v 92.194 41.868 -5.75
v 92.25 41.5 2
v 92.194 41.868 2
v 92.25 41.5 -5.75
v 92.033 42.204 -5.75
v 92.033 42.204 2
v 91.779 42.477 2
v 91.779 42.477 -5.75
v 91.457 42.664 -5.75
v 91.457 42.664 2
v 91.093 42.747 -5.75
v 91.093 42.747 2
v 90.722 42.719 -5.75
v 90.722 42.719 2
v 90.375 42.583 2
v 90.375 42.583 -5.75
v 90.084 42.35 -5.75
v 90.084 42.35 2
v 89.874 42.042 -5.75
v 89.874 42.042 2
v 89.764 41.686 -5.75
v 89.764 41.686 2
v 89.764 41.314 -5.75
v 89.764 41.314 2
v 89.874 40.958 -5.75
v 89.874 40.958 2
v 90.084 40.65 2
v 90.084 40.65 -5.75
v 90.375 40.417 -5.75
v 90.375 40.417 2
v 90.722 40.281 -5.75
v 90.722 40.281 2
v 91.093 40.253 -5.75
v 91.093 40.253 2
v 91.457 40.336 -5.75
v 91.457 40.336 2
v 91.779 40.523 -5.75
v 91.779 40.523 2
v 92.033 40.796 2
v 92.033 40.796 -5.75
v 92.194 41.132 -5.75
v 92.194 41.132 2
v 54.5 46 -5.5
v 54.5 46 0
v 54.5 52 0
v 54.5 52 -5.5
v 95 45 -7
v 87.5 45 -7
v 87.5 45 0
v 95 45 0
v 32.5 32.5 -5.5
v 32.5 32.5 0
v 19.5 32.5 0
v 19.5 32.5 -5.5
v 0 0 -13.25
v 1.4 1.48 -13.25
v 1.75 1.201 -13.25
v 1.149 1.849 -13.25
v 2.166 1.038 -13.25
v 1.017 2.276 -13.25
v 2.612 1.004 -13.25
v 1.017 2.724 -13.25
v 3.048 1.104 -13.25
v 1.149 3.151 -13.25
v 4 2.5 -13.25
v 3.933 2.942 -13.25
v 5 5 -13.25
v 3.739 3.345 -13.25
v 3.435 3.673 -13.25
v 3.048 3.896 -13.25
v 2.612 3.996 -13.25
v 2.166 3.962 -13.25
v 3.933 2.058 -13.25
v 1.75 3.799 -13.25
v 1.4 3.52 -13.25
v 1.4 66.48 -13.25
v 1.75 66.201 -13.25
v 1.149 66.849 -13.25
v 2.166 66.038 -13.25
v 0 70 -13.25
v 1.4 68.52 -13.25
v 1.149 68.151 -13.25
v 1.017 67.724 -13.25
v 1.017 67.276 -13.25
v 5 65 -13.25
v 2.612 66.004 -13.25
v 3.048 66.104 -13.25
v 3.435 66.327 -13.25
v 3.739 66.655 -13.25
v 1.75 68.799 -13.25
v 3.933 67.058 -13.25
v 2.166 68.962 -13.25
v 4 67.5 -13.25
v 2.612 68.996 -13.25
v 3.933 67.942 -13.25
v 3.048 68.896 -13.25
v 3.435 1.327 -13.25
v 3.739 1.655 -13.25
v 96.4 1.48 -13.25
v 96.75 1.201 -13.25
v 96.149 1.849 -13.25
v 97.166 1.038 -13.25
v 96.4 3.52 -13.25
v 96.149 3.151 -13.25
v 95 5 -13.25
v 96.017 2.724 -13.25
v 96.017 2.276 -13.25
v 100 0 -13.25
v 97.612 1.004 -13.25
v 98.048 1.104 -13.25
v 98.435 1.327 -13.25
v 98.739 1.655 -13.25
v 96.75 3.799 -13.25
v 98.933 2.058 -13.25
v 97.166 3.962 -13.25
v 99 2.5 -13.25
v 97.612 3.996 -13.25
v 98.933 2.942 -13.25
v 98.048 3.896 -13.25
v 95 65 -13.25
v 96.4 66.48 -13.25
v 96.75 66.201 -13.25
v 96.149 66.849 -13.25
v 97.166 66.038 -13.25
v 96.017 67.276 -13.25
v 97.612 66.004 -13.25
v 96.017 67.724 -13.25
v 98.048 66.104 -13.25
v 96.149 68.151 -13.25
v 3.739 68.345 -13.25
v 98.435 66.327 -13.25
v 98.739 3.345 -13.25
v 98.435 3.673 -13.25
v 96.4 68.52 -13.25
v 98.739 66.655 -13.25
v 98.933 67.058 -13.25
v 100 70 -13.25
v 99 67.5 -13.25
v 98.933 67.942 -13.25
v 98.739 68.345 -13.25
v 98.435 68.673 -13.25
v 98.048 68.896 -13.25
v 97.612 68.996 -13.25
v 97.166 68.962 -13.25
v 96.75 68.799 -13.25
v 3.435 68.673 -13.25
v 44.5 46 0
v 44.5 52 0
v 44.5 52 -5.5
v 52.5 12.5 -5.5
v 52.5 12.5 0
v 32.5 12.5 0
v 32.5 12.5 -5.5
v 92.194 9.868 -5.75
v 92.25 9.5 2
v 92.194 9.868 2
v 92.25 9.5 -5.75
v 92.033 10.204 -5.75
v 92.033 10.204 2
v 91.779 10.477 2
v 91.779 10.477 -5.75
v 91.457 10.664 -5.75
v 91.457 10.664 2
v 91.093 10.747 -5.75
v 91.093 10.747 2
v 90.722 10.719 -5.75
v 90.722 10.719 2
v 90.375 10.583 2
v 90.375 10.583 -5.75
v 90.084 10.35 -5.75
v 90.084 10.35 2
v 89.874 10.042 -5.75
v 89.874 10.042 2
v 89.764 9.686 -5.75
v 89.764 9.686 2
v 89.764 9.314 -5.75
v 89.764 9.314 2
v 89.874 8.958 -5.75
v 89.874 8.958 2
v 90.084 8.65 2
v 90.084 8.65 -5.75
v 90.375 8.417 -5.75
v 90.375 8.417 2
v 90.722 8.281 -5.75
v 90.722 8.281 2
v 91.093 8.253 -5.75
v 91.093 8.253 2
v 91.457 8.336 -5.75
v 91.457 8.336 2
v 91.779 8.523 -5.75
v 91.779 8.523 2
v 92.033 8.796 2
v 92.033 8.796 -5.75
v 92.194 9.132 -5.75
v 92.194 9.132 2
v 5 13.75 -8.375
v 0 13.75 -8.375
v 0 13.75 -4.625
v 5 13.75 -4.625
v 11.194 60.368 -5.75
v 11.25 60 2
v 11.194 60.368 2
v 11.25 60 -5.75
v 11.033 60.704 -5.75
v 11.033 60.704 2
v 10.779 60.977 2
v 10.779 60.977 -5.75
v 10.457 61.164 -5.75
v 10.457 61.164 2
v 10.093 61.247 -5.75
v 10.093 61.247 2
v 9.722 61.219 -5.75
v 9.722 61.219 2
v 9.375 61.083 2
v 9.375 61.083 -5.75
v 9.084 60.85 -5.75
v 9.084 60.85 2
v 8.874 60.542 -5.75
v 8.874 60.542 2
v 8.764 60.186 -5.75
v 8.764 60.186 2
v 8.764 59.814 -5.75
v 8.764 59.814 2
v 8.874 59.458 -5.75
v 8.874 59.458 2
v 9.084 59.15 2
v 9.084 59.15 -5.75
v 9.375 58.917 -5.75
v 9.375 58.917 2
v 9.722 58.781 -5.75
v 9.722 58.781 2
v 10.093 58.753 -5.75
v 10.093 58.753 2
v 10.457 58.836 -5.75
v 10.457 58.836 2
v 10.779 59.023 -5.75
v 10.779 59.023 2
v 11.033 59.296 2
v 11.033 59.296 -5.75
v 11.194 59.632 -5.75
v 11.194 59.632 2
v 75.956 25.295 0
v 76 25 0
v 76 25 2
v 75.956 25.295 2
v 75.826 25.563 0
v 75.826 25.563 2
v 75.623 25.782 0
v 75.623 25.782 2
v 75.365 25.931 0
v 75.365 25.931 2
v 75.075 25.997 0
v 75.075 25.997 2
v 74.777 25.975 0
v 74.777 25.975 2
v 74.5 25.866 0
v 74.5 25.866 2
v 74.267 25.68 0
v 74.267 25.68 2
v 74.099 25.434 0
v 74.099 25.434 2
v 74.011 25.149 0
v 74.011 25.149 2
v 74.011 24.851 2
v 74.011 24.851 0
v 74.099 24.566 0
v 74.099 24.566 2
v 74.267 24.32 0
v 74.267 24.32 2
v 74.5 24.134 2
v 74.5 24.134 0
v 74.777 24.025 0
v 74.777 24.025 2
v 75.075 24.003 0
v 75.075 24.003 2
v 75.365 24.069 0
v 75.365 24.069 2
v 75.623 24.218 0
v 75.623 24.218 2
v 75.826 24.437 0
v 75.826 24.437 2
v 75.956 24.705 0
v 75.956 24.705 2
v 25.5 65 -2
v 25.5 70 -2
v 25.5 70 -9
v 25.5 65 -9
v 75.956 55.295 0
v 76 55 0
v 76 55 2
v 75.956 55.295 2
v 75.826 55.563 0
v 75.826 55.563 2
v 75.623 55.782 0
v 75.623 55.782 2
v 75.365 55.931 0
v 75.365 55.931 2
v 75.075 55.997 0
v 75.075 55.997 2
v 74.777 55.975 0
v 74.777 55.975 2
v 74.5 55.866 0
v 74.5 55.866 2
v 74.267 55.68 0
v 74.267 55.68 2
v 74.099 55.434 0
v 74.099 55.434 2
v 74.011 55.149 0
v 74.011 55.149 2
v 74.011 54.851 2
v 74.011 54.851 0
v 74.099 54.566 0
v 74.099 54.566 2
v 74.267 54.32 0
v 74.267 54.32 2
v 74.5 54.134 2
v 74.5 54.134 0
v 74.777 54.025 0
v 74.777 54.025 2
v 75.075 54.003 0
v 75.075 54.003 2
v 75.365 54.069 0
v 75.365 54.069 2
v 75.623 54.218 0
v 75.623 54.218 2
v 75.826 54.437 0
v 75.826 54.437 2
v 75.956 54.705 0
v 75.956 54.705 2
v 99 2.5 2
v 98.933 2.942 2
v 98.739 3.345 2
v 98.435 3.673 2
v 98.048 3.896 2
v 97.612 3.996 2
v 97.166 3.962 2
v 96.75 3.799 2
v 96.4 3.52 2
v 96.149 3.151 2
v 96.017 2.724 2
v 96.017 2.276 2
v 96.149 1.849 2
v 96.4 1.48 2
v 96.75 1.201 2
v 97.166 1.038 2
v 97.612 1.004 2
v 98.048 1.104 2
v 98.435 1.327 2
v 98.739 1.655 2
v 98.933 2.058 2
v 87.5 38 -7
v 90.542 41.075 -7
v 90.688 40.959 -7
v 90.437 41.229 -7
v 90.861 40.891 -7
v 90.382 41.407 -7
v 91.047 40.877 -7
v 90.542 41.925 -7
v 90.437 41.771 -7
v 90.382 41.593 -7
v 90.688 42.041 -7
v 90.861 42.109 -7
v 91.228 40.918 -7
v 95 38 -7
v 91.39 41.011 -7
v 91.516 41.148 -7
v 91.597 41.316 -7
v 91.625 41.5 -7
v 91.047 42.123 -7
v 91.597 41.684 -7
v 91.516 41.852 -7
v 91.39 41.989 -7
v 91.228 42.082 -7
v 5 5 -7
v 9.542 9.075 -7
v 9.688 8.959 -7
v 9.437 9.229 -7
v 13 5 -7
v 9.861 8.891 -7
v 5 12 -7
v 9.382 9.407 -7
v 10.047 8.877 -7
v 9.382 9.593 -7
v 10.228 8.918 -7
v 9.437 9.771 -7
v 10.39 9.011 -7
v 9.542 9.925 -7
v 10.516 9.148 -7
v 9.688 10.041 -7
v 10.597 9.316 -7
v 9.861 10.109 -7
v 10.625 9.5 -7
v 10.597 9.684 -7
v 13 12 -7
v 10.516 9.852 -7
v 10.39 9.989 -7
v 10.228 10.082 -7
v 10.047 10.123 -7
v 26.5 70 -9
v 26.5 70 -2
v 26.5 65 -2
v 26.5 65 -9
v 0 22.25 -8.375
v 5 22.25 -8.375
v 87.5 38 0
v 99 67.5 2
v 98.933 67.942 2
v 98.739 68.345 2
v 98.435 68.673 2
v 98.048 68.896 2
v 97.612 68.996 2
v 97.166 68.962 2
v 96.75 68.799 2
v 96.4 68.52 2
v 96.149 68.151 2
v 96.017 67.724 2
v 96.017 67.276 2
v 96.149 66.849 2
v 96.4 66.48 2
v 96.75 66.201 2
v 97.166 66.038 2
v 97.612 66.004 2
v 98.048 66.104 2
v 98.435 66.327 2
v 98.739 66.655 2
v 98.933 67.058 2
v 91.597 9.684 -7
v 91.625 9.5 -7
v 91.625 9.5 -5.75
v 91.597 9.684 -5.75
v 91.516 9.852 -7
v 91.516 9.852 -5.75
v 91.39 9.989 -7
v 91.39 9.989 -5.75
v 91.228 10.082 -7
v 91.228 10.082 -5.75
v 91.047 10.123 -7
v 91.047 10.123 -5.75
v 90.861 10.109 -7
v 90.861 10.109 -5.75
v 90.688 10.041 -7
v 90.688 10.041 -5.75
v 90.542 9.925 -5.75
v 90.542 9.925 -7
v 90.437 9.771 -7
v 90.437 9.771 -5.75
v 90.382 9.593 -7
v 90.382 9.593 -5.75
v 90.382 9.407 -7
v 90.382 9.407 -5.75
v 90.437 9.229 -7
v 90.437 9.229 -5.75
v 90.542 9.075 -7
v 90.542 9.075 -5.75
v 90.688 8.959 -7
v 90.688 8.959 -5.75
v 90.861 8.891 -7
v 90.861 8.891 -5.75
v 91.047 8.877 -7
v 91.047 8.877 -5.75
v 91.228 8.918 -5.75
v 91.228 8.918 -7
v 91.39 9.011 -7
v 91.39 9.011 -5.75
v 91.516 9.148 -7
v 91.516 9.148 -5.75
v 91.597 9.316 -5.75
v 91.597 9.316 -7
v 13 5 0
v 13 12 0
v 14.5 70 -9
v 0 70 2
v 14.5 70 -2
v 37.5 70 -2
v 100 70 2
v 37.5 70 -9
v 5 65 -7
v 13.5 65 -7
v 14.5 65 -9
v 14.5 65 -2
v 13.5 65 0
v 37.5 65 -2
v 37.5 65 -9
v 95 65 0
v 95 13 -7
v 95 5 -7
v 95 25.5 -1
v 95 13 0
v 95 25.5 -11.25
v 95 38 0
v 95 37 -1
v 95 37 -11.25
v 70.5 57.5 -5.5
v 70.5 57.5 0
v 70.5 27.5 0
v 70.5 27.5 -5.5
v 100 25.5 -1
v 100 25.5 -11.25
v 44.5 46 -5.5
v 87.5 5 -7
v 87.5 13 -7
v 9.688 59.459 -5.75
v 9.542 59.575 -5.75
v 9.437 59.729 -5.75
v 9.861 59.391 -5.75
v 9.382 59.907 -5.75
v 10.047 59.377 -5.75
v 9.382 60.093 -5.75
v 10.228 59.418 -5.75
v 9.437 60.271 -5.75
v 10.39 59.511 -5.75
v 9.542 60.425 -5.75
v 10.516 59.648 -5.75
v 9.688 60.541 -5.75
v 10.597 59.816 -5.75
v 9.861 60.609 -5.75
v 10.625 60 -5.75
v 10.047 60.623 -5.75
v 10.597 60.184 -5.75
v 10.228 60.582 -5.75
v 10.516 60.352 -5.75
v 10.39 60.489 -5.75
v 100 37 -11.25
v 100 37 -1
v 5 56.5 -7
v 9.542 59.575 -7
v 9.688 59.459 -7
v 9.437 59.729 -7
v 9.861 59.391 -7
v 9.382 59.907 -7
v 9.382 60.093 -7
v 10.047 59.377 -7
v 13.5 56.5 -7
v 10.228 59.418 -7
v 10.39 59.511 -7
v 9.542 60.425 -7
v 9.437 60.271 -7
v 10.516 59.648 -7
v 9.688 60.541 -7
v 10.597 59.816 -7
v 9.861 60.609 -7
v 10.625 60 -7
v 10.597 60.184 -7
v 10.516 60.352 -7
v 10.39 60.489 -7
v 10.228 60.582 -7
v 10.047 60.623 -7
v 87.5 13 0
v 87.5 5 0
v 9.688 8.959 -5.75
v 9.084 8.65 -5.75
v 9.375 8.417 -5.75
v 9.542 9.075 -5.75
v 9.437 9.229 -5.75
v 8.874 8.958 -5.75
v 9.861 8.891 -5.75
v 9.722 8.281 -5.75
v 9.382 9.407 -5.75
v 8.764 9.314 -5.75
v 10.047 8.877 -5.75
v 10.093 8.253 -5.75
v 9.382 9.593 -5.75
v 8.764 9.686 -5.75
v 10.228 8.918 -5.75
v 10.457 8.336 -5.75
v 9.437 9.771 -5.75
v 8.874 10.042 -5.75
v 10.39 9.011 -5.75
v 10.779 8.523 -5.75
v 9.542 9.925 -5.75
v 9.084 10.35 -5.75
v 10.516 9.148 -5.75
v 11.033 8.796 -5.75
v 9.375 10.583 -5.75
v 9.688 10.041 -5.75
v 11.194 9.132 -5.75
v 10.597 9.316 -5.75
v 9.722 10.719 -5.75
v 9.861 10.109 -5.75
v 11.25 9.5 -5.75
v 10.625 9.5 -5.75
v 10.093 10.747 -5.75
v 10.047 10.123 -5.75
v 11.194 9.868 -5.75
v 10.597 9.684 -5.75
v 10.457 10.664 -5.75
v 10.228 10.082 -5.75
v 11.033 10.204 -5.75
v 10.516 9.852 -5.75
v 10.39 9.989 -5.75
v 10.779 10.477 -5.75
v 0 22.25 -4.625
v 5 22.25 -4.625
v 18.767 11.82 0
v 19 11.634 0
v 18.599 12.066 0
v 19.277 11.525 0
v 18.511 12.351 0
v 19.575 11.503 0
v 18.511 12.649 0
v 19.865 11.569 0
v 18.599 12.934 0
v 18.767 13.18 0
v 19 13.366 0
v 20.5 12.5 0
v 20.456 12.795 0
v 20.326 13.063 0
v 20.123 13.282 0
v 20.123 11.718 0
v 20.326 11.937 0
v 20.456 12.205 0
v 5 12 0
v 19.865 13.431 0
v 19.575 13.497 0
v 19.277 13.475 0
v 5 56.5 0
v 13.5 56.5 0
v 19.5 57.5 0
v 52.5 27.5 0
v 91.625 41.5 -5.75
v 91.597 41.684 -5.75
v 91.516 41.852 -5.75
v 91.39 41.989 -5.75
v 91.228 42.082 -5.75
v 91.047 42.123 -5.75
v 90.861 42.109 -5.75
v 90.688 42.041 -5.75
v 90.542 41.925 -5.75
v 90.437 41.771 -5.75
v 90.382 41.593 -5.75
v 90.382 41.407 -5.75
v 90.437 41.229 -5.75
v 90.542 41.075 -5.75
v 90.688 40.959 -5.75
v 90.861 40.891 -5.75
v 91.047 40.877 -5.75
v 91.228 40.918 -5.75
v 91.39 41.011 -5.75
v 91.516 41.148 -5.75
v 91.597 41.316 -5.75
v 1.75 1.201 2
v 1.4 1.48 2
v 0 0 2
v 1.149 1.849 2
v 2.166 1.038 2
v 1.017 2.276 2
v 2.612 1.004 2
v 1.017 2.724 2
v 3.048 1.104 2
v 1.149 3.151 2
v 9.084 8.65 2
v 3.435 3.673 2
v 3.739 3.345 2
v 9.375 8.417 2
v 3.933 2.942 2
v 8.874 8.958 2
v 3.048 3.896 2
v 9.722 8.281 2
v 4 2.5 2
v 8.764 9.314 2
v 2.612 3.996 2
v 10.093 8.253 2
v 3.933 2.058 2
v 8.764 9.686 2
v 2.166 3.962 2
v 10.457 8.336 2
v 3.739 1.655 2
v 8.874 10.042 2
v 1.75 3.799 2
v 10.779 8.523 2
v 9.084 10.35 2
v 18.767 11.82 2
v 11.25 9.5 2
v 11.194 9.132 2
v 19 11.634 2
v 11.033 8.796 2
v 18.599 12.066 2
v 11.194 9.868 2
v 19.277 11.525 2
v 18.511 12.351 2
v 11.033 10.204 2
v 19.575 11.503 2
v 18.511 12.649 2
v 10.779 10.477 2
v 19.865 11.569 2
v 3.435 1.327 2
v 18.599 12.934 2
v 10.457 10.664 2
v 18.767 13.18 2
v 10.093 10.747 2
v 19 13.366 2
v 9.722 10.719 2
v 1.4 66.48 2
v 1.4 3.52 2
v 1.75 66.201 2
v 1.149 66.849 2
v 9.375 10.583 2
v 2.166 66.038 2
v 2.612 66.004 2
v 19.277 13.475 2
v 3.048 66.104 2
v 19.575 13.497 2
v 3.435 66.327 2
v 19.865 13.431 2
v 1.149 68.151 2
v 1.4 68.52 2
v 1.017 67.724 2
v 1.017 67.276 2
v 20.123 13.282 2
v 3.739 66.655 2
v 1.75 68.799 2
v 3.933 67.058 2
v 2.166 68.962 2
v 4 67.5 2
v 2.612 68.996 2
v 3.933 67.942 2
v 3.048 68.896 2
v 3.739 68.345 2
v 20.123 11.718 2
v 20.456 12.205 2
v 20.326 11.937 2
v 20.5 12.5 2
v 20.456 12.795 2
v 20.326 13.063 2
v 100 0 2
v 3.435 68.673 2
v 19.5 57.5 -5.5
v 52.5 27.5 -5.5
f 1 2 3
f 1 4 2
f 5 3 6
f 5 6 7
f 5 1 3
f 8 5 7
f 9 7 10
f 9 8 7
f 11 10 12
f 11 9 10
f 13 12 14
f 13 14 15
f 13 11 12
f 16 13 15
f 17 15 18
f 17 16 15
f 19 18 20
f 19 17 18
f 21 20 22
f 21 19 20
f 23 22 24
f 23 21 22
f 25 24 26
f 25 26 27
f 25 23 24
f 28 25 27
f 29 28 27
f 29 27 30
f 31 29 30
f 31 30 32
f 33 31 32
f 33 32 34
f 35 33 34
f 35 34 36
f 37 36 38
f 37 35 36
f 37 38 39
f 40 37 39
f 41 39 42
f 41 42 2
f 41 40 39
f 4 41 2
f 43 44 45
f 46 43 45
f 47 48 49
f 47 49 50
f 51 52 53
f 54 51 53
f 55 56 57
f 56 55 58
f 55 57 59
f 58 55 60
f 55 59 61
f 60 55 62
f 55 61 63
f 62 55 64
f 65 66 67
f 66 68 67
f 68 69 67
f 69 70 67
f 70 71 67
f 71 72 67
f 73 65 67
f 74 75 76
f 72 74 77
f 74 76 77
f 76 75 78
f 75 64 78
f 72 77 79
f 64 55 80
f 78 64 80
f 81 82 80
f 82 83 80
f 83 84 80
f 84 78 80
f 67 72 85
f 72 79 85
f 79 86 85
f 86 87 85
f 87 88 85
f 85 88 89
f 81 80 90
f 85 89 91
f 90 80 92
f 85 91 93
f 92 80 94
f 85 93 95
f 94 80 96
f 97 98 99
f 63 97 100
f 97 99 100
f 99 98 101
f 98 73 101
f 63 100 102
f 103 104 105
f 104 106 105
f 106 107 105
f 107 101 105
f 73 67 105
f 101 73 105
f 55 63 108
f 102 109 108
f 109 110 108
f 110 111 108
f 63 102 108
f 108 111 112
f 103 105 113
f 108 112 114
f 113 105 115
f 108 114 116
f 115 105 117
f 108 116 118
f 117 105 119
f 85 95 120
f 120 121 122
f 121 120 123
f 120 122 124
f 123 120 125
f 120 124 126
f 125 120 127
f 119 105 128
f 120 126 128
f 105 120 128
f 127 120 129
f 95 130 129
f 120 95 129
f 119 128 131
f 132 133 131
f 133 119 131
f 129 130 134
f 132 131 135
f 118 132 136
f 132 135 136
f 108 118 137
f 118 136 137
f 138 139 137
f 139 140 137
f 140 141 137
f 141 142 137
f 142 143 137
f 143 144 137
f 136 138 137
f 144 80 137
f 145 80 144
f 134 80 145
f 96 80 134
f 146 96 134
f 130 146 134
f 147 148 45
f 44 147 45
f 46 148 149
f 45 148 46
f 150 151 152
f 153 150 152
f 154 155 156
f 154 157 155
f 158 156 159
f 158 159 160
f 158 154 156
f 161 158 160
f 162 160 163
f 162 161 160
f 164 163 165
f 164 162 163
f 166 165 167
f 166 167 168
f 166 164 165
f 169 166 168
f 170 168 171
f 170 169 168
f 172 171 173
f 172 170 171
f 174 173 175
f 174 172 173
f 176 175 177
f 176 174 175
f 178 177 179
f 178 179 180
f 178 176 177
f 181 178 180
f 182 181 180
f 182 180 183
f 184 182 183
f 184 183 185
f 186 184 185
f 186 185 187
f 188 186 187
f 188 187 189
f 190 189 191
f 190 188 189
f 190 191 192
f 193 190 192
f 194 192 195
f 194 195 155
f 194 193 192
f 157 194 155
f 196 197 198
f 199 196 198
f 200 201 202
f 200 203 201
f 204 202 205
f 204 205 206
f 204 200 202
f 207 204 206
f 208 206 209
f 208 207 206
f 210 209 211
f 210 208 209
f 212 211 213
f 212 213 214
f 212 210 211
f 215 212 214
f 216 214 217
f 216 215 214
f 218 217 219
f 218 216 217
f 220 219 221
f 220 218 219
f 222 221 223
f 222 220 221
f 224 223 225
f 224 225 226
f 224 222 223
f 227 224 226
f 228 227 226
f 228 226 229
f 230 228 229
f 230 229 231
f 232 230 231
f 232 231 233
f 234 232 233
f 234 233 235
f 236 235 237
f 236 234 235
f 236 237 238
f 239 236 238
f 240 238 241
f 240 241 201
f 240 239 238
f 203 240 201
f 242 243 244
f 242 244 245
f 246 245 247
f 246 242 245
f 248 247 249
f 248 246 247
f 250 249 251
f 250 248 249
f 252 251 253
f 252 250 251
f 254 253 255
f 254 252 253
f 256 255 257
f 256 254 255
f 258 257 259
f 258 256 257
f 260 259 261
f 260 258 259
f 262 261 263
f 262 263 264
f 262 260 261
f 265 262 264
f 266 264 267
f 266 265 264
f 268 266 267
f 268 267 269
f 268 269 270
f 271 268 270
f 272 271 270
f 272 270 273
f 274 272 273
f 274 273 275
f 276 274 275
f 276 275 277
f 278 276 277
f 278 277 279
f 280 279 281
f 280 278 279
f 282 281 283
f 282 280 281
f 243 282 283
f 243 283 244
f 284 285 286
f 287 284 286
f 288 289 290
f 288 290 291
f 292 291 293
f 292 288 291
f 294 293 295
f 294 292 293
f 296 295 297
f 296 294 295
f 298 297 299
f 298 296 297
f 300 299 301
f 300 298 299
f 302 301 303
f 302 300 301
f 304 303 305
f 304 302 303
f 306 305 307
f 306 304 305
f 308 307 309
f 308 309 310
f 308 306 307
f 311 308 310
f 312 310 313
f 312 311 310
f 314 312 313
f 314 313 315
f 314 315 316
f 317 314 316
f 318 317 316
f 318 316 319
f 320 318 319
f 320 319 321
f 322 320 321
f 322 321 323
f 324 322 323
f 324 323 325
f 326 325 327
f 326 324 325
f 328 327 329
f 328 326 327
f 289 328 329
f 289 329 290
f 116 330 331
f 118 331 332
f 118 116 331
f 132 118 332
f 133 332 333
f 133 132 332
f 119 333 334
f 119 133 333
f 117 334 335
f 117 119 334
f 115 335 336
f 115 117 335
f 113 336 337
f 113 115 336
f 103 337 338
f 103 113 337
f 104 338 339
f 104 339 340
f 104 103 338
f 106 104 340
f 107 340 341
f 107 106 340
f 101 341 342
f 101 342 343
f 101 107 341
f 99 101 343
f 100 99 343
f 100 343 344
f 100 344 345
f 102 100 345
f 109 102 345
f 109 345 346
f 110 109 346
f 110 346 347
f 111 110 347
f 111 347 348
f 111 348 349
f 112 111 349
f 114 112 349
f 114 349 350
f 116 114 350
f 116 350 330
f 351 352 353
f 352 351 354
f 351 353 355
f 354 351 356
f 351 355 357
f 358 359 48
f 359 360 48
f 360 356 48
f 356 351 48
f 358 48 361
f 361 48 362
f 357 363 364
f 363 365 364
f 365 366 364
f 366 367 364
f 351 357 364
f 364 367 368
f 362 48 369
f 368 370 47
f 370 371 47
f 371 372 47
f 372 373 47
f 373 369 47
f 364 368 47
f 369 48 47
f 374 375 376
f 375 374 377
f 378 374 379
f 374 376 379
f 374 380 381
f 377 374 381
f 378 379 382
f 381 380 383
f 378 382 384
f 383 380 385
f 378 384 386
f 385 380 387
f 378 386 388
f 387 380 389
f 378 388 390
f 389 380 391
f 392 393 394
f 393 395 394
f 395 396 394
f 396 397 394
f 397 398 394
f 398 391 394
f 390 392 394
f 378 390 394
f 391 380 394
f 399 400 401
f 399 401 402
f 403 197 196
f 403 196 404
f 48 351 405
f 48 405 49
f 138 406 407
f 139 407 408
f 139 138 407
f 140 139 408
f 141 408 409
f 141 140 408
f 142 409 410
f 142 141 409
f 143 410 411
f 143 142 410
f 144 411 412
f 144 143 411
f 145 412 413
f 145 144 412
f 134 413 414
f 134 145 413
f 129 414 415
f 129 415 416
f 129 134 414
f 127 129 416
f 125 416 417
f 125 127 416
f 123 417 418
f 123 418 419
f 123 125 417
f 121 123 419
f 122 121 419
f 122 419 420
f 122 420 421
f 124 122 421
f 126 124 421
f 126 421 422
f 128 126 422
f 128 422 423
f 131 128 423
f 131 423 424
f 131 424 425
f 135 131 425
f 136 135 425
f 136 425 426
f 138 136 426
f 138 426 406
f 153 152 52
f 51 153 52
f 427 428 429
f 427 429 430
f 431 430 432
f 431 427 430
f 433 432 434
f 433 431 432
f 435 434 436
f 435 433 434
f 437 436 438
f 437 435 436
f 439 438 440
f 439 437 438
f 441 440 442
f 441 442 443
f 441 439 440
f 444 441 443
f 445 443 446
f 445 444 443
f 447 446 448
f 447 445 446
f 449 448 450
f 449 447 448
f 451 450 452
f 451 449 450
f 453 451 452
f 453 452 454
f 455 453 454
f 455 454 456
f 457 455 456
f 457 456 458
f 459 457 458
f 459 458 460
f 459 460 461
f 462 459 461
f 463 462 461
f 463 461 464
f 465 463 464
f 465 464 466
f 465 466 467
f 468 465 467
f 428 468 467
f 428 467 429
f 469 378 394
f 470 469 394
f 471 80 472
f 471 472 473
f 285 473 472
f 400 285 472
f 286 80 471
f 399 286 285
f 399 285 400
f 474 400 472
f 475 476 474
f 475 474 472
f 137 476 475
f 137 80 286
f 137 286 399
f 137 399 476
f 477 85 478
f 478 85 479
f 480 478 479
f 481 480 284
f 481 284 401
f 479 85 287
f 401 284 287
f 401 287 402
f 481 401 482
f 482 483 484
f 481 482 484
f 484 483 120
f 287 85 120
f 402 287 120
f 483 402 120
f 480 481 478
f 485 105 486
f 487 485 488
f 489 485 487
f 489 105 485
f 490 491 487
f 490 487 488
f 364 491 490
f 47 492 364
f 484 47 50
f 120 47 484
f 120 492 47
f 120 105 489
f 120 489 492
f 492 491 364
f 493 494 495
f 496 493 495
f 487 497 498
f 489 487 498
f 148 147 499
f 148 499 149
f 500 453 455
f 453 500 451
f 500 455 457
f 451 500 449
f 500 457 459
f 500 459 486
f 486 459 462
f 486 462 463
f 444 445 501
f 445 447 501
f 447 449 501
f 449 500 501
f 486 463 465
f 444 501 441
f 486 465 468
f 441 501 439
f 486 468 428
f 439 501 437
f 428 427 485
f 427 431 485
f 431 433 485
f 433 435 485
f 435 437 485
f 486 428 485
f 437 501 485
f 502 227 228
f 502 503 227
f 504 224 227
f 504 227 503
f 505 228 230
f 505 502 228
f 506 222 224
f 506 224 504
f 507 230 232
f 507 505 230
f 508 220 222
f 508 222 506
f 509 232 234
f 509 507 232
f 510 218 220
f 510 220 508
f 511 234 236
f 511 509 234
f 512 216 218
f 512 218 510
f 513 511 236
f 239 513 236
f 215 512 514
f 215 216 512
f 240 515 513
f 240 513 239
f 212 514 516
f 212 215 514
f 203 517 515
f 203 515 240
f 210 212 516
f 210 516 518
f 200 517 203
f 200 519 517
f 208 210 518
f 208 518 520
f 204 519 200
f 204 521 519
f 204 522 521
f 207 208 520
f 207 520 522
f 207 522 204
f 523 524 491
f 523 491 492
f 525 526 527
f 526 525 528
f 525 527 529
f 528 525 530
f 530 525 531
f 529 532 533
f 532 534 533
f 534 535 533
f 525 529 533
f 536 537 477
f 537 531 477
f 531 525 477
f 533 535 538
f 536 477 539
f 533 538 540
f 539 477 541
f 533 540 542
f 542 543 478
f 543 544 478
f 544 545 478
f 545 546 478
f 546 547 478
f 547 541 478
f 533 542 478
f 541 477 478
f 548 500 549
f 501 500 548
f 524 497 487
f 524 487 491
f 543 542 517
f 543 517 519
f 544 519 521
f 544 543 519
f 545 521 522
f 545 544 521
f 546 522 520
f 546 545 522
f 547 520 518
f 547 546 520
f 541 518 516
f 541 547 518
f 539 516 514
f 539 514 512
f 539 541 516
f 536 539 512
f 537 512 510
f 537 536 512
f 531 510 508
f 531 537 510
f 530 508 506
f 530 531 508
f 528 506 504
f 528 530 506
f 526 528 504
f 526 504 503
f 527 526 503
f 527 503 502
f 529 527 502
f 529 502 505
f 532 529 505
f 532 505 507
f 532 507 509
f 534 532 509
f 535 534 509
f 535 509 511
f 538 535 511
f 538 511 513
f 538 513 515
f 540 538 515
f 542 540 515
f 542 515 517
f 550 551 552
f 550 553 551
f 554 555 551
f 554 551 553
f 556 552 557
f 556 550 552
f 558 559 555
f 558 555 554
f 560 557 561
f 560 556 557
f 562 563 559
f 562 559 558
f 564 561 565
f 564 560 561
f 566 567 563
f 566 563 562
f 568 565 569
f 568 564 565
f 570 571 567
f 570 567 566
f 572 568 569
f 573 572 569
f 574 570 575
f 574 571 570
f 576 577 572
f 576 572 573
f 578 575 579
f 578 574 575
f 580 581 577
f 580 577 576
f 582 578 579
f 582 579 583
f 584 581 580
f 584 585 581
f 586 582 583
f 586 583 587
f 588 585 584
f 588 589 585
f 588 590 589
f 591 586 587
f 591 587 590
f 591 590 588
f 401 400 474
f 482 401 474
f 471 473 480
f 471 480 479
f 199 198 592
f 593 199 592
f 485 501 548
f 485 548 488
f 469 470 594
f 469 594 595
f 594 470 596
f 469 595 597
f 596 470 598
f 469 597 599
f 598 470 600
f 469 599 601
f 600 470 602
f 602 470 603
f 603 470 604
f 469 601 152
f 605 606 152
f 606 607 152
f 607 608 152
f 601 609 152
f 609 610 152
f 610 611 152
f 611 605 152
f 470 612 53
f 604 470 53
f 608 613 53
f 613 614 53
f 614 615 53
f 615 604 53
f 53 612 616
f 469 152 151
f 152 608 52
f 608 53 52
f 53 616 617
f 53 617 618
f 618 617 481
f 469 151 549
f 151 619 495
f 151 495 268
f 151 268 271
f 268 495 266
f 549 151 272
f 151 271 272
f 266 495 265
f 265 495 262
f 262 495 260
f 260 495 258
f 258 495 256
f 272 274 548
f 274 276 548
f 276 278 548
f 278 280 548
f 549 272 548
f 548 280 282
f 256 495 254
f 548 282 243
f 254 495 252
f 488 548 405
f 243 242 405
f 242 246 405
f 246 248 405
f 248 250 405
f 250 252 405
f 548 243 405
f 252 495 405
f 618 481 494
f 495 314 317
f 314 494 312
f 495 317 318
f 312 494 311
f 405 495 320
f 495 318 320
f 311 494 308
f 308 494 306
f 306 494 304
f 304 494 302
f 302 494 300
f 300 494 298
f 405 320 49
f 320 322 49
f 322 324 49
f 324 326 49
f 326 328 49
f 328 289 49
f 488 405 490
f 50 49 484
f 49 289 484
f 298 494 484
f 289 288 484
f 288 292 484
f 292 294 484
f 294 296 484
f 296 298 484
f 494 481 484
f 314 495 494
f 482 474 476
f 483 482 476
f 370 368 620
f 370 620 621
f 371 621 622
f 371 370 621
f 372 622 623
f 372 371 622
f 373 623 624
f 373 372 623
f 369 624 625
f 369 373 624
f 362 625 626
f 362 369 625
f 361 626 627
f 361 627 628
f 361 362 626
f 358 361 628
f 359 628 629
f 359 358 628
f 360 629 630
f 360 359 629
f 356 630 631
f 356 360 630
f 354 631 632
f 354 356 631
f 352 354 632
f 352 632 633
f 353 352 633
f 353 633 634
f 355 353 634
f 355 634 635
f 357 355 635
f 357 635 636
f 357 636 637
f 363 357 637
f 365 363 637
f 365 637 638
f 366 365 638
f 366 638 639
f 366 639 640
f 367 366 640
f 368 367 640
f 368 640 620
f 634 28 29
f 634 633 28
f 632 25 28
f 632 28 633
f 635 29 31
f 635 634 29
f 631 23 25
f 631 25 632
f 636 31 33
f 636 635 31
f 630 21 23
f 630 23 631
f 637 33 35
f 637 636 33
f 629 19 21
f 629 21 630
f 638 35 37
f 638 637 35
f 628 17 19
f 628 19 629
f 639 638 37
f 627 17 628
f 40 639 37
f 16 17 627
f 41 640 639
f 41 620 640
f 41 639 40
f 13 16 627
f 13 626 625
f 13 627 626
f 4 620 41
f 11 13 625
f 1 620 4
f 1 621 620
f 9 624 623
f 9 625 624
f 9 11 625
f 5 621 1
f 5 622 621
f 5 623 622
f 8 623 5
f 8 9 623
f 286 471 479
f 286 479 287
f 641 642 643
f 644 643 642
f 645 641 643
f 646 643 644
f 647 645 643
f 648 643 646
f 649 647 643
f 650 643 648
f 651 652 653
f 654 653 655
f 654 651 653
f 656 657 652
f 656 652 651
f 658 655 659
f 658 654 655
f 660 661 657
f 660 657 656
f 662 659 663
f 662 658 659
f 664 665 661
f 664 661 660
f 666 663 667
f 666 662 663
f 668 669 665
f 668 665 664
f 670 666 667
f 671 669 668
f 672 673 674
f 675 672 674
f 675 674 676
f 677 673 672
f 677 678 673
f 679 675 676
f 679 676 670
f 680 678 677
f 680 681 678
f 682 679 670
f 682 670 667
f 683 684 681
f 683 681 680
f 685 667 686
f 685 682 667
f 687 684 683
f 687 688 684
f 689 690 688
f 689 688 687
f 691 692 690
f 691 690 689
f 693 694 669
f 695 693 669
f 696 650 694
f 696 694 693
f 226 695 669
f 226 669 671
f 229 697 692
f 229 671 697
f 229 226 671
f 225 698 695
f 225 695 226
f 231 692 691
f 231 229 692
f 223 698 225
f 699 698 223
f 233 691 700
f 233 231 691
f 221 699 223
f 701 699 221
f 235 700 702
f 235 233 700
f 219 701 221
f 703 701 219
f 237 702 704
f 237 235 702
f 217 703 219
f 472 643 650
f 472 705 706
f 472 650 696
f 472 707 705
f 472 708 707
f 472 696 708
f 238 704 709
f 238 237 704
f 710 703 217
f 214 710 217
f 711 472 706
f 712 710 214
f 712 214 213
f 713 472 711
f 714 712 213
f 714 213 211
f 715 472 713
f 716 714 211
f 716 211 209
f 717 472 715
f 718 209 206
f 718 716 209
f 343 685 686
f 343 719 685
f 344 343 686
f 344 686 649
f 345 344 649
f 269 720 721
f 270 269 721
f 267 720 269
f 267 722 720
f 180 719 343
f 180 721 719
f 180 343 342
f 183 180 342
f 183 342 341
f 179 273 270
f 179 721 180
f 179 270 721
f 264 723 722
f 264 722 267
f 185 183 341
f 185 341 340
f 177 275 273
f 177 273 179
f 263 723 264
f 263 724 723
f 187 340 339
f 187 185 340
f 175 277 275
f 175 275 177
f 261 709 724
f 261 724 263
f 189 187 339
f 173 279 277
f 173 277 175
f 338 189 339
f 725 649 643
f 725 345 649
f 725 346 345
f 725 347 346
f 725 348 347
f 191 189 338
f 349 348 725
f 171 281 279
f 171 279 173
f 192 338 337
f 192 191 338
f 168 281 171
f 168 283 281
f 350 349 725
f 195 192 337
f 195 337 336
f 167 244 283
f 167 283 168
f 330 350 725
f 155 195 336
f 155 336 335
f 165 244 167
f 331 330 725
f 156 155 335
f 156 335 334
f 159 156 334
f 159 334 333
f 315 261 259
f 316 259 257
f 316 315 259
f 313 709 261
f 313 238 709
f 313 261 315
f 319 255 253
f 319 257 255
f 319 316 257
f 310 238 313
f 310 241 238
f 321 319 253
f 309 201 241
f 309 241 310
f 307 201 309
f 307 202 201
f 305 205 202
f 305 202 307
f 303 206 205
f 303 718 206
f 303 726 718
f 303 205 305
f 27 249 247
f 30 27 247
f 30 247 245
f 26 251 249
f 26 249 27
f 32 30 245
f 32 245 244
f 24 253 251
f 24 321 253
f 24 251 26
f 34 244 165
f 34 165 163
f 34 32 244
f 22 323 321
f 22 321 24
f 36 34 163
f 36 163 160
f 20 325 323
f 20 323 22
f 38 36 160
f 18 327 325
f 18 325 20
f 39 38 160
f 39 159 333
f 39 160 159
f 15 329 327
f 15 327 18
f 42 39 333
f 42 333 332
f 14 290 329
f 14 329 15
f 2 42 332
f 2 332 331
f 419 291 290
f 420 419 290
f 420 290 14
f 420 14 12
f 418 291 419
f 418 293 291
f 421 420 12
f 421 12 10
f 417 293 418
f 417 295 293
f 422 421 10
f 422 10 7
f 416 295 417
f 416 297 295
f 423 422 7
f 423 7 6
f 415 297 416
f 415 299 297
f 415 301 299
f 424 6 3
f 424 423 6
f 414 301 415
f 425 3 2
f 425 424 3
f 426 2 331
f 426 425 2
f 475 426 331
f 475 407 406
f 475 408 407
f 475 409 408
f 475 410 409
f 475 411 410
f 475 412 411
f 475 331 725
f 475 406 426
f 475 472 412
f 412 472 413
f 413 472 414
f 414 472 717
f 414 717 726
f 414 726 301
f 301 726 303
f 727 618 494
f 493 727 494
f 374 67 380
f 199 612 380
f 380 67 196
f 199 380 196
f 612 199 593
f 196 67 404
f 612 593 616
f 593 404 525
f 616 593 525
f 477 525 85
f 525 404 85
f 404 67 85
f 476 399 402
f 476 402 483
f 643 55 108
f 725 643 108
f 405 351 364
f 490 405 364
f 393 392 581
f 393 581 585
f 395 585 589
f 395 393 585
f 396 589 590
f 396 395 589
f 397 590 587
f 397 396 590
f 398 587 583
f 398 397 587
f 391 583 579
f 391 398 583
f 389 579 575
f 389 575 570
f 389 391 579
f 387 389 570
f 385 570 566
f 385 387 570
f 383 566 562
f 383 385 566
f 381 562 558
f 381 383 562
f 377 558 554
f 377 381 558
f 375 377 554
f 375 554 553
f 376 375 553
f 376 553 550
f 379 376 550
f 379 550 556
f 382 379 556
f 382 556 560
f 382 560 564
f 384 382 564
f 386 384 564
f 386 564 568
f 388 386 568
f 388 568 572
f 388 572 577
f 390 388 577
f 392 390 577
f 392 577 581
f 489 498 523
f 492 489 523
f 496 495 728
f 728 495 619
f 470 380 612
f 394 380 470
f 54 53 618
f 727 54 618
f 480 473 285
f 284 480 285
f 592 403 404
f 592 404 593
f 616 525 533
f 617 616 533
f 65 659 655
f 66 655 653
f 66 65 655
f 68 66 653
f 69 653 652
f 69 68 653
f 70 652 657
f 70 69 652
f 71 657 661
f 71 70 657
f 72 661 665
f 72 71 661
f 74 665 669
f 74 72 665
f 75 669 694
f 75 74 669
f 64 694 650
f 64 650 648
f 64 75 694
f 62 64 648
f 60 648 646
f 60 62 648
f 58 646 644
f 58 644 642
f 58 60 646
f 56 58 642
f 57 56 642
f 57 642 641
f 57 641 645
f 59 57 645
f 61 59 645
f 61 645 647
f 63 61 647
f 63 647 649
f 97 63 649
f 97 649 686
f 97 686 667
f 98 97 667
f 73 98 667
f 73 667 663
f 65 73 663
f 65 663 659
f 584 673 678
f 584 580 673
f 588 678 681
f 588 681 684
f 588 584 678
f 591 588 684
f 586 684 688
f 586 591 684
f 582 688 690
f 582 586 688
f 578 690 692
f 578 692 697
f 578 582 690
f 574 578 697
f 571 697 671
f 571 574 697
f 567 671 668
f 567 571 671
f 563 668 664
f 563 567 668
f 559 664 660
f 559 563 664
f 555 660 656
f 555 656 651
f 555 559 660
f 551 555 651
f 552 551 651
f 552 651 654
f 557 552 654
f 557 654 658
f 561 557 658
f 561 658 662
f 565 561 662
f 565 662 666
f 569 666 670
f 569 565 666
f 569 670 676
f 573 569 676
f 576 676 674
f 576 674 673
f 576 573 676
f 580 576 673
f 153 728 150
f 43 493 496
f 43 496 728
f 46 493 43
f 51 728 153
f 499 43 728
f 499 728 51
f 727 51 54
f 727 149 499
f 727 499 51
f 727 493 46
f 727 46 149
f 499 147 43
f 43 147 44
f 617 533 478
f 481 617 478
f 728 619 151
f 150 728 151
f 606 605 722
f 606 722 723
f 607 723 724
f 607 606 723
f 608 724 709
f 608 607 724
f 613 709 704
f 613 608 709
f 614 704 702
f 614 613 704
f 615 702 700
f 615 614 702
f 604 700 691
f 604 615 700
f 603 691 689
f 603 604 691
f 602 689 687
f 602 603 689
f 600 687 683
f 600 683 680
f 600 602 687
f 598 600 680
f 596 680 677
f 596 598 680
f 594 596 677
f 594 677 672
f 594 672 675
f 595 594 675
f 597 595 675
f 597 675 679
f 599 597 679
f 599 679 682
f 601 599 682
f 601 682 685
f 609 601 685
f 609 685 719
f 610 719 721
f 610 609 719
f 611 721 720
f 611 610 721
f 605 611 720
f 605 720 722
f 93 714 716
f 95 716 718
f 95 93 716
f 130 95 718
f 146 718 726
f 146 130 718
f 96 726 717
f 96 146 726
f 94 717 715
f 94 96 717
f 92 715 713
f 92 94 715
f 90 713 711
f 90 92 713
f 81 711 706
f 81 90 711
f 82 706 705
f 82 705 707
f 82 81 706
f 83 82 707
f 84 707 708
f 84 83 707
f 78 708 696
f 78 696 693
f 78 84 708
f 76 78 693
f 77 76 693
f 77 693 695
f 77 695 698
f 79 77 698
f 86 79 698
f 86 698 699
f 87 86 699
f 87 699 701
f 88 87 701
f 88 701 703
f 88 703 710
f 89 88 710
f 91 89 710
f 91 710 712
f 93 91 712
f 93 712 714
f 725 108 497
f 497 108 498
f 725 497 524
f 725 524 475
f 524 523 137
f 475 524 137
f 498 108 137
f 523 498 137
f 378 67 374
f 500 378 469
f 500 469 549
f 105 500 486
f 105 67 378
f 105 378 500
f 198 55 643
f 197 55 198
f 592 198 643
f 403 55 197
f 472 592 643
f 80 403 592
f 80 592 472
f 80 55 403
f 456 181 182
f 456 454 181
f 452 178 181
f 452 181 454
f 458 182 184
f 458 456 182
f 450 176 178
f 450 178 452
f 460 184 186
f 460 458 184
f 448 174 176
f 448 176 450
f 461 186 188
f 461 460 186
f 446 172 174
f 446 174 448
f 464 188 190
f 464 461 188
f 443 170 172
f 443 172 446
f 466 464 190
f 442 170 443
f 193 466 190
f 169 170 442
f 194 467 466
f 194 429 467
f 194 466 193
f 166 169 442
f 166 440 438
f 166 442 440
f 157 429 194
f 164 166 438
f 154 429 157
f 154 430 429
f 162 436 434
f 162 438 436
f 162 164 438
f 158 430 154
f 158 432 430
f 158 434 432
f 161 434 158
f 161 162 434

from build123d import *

# Parameters (mm, degrees)
SKETCH1_W           = 100
SKETCH1_H           = 70
SKETCH1_R           = 1.5
SKETCH1_R_2         = 1.25
SKETCH1_R_3         = 1
BOSS_EXTRUDE6_DEPTH = 2
BOSS_EXTRUDE7_START = -7
SKETCH1_16_W        = 100
SKETCH1_16_H        = 70
SKETCH1_16_R        = 1.5
SKETCH1_16_W_2      = 90
SKETCH1_16_H_2      = 60
SKETCH1_16_W_3      = 8
SKETCH1_16_H_3      = 7
SKETCH1_16_R_2      = 1.75
SKETCH1_16_W_4      = 7.5
SKETCH1_16_H_4      = 8
SKETCH1_16_W_5      = 8.5
SKETCH1_16_H_5      = 8.5
SKETCH1_16_R_3      = 1.25
SKETCH1_16_R_4      = 0.625
BOSS_EXTRUDE7_DEPTH = 7
SKETCH1_18_W        = 10
SKETCH1_18_H        = 6
BOSS_EXTRUDE8_DEPTH = 5.5
CUT_EXTRUDE2_START  = -5.75
SKETCH1_19_R        = 1.25
SKETCH1_19_R_2      = 0.625
CUT_EXTRUDE2_DEPTH  = 5.75
BOSS_EXTRUDE9_START = -13.25
SKETCH1_20_W        = 100
SKETCH1_20_H        = 70
SKETCH1_20_R        = 1.5
SKETCH1_20_W_2      = 90
SKETCH1_20_H_2      = 60
BOSS_EXTRUDE9_DEPTH = 13.25
SKETCH4_W           = 10.25
SKETCH4_H           = 11.5
CUT_EXTRUDE3_DEPTH  = 5
SKETCH5_W           = 3.75
SKETCH5_H           = 8.5
CUT_EXTRUDE4_DEPTH  = 5
SKETCH6_W           = 11
SKETCH6_H           = 7
CUT_EXTRUDE5_DEPTH  = 5


with BuildPart() as part:
    # Sketch1 → Boss-Extrude6 (new body)
    with BuildSketch(Plane.XY):
        with Locations((50, 35)):
            Rectangle(SKETCH1_W, SKETCH1_H)
        with Locations((2.5, 2.5)):
            Circle(SKETCH1_R, mode=Mode.SUBTRACT)
        with Locations((2.5, 67.5)):
            Circle(SKETCH1_R, mode=Mode.SUBTRACT)
        with Locations((97.5, 67.5)):
            Circle(SKETCH1_R, mode=Mode.SUBTRACT)
        with Locations((97.5, 2.5)):
            Circle(SKETCH1_R, mode=Mode.SUBTRACT)
        with Locations((10, 9.5)):
            Circle(SKETCH1_R_2, mode=Mode.SUBTRACT)
        with Locations((10, 60)):
            Circle(SKETCH1_R_2, mode=Mode.SUBTRACT)
        with Locations((91, 41.5)):
            Circle(SKETCH1_R_2, mode=Mode.SUBTRACT)
        with Locations((91, 9.5)):
            Circle(SKETCH1_R_2, mode=Mode.SUBTRACT)
        with Locations((19.5, 12.5)):
            Circle(SKETCH1_R_3, mode=Mode.SUBTRACT)
        with Locations((75, 55)):
            Circle(SKETCH1_R_3, mode=Mode.SUBTRACT)
        with Locations((75, 25)):
            Circle(SKETCH1_R_3, mode=Mode.SUBTRACT)
    extrude(amount=BOSS_EXTRUDE6_DEPTH)

    # Sketch1<16> → Boss-Extrude7 (add)
    # profile 1 of 13: a face of its own
    with BuildSketch(Plane.XY.offset(BOSS_EXTRUDE7_START)):
        with Locations((50, 35)):
            Rectangle(SKETCH1_16_W, SKETCH1_16_H)
        with Locations((97.5, 2.5)):
            Circle(SKETCH1_16_R, mode=Mode.SUBTRACT)
        with Locations((97.5, 67.5)):
            Circle(SKETCH1_16_R, mode=Mode.SUBTRACT)
        with Locations((2.5, 67.5)):
            Circle(SKETCH1_16_R, mode=Mode.SUBTRACT)
        with Locations((2.5, 2.5)):
            Circle(SKETCH1_16_R, mode=Mode.SUBTRACT)
        with Locations((50, 35)):
            Rectangle(SKETCH1_16_W_2, SKETCH1_16_H_2, mode=Mode.SUBTRACT)
    # profile 2 of 13: a face of its own
    with BuildSketch(Plane.XY.offset(BOSS_EXTRUDE7_START)):
        with Locations((9, 8.5)):
            Rectangle(SKETCH1_16_W_3, SKETCH1_16_H_3)
        with Locations((10, 9.5)):
            Circle(SKETCH1_16_R_2, mode=Mode.SUBTRACT)
    # profile 3 of 13: a face of its own
    with BuildSketch(Plane.XY.offset(BOSS_EXTRUDE7_START)):
        with Locations((91.25, 9)):
            Rectangle(SKETCH1_16_W_4, SKETCH1_16_H_4)
        with Locations((91, 9.5)):
            Circle(SKETCH1_16_R_2, mode=Mode.SUBTRACT)
    # profile 4 of 13: a face of its own
    with BuildSketch(Plane.XY.offset(BOSS_EXTRUDE7_START)):
        with Locations((91.25, 41.5)):
            Rectangle(SKETCH1_16_W_4, SKETCH1_16_H_3)
        with Locations((91, 41.5)):
            Circle(SKETCH1_16_R_2, mode=Mode.SUBTRACT)
    # profile 5 of 13: a face of its own
    with BuildSketch(Plane.XY.offset(BOSS_EXTRUDE7_START)):
        with Locations((9.25, 60.75)):
            Rectangle(SKETCH1_16_W_5, SKETCH1_16_H_5)
        with Locations((10, 60)):
            Circle(SKETCH1_16_R_2, mode=Mode.SUBTRACT)
    # profile 6 of 13: a face of its own
    with BuildSketch(Plane.XY.offset(BOSS_EXTRUDE7_START)):
        with Locations((10, 60)):
            Circle(SKETCH1_16_R_2)
        with Locations((10, 60)):
            Circle(SKETCH1_16_R_3, mode=Mode.SUBTRACT)
    # profile 7 of 13: a face of its own
    with BuildSketch(Plane.XY.offset(BOSS_EXTRUDE7_START)):
        with Locations((10, 60)):
            Circle(SKETCH1_16_R_3)
        with Locations((10, 60)):
            Circle(SKETCH1_16_R_4, mode=Mode.SUBTRACT)
    # profile 8 of 13: a face of its own
    with BuildSketch(Plane.XY.offset(BOSS_EXTRUDE7_START)):
        with Locations((10, 9.5)):
            Circle(SKETCH1_16_R_2)
        with Locations((10, 9.5)):
            Circle(SKETCH1_16_R_3, mode=Mode.SUBTRACT)
    # profile 9 of 13: a face of its own
    with BuildSketch(Plane.XY.offset(BOSS_EXTRUDE7_START)):
        with Locations((10, 9.5)):
            Circle(SKETCH1_16_R_3)
        with Locations((10, 9.5)):
            Circle(SKETCH1_16_R_4, mode=Mode.SUBTRACT)
    # profile 10 of 13: a face of its own
    with BuildSketch(Plane.XY.offset(BOSS_EXTRUDE7_START)):
        with Locations((91, 9.5)):
            Circle(SKETCH1_16_R_2)
        with Locations((91, 9.5)):
            Circle(SKETCH1_16_R_3, mode=Mode.SUBTRACT)
    # profile 11 of 13: a face of its own
    with BuildSketch(Plane.XY.offset(BOSS_EXTRUDE7_START)):
        with Locations((91, 9.5)):
            Circle(SKETCH1_16_R_3)
        with Locations((91, 9.5)):
            Circle(SKETCH1_16_R_4, mode=Mode.SUBTRACT)
    # profile 12 of 13: a face of its own
    with BuildSketch(Plane.XY.offset(BOSS_EXTRUDE7_START)):
        with Locations((91, 41.5)):
            Circle(SKETCH1_16_R_2)
        with Locations((91, 41.5)):
            Circle(SKETCH1_16_R_3, mode=Mode.SUBTRACT)
    # profile 13 of 13: a face of its own
    with BuildSketch(Plane.XY.offset(BOSS_EXTRUDE7_START)):
        with Locations((91, 41.5)):
            Circle(SKETCH1_16_R_3)
        with Locations((91, 41.5)):
            Circle(SKETCH1_16_R_4, mode=Mode.SUBTRACT)
    extrude(amount=BOSS_EXTRUDE7_DEPTH)

    # Sketch1<18> → Boss-Extrude8 (add)
    with BuildSketch(Plane.XY):
        Polygon((19.5, 32.5), (19.5, 57.5), (70.5, 57.5), (70.5, 27.5), (52.5, 27.5), (52.5, 12.5), (32.5, 12.5), (32.5, 32.5), align=None)
        with Locations((49.5, 49)):
            Rectangle(SKETCH1_18_W, SKETCH1_18_H, mode=Mode.SUBTRACT)
    extrude(amount=-BOSS_EXTRUDE8_DEPTH)

    # Sketch1<19> → Cut-Extrude2 (cut)
    # profile 1 of 4: a face of its own
    with BuildSketch(Plane.XY.offset(CUT_EXTRUDE2_START)):
        with Locations((10, 60)):
            Circle(SKETCH1_19_R)
        with Locations((10, 60)):
            Circle(SKETCH1_19_R_2, mode=Mode.SUBTRACT)
    # profile 2 of 4: a face of its own
    with BuildSketch(Plane.XY.offset(CUT_EXTRUDE2_START)):
        with Locations((10, 9.5)):
            Circle(SKETCH1_19_R)
        with Locations((10, 9.5)):
            Circle(SKETCH1_19_R_2, mode=Mode.SUBTRACT)
    # profile 3 of 4: a face of its own
    with BuildSketch(Plane.XY.offset(CUT_EXTRUDE2_START)):
        with Locations((91, 9.5)):
            Circle(SKETCH1_19_R)
        with Locations((91, 9.5)):
            Circle(SKETCH1_19_R_2, mode=Mode.SUBTRACT)
    # profile 4 of 4: a face of its own
    with BuildSketch(Plane.XY.offset(CUT_EXTRUDE2_START)):
        with Locations((91, 41.5)):
            Circle(SKETCH1_19_R)
        with Locations((91, 41.5)):
            Circle(SKETCH1_19_R_2, mode=Mode.SUBTRACT)
    extrude(amount=CUT_EXTRUDE2_DEPTH, mode=Mode.SUBTRACT)

    # Sketch1<20> → Boss-Extrude9 (add)
    with BuildSketch(Plane.XY.offset(BOSS_EXTRUDE9_START)):
        with Locations((50, 35)):
            Rectangle(SKETCH1_20_W, SKETCH1_20_H)
        with Locations((97.5, 2.5)):
            Circle(SKETCH1_20_R, mode=Mode.SUBTRACT)
        with Locations((97.5, 67.5)):
            Circle(SKETCH1_20_R, mode=Mode.SUBTRACT)
        with Locations((2.5, 67.5)):
            Circle(SKETCH1_20_R, mode=Mode.SUBTRACT)
        with Locations((2.5, 2.5)):
            Circle(SKETCH1_20_R, mode=Mode.SUBTRACT)
        with Locations((50, 35)):
            Rectangle(SKETCH1_20_W_2, SKETCH1_20_H_2, mode=Mode.SUBTRACT)
    extrude(amount=BOSS_EXTRUDE9_DEPTH)

    # Sketch4 → Cut-Extrude3 (cut)
    with BuildSketch(Plane(origin=(100, 0, 0), x_dir=(0, 0, -1), z_dir=(1, 0, 0))):
        with Locations((6.125, 31.25)):
            Rectangle(SKETCH4_W, SKETCH4_H)
    extrude(amount=-CUT_EXTRUDE3_DEPTH, mode=Mode.SUBTRACT)

    # Sketch5 → Cut-Extrude4 (cut)
    with BuildSketch(Plane.ZY):
        with Locations((-6.5, 18)):
            Rectangle(SKETCH5_W, SKETCH5_H)
    extrude(amount=-CUT_EXTRUDE4_DEPTH, mode=Mode.SUBTRACT)

    # Sketch6 → Cut-Extrude5 (cut)
    with BuildSketch(Plane(origin=(0, 70, 0), x_dir=(1, 0, 0), z_dir=(0, 1, 0))):
        with Locations((20, 5.5)):
            Rectangle(SKETCH6_W, SKETCH6_H)
        with Locations((32, 5.5)):
            Rectangle(SKETCH6_W, SKETCH6_H)
    extrude(amount=-CUT_EXTRUDE5_DEPTH, mode=Mode.SUBTRACT)


solid = part.part
